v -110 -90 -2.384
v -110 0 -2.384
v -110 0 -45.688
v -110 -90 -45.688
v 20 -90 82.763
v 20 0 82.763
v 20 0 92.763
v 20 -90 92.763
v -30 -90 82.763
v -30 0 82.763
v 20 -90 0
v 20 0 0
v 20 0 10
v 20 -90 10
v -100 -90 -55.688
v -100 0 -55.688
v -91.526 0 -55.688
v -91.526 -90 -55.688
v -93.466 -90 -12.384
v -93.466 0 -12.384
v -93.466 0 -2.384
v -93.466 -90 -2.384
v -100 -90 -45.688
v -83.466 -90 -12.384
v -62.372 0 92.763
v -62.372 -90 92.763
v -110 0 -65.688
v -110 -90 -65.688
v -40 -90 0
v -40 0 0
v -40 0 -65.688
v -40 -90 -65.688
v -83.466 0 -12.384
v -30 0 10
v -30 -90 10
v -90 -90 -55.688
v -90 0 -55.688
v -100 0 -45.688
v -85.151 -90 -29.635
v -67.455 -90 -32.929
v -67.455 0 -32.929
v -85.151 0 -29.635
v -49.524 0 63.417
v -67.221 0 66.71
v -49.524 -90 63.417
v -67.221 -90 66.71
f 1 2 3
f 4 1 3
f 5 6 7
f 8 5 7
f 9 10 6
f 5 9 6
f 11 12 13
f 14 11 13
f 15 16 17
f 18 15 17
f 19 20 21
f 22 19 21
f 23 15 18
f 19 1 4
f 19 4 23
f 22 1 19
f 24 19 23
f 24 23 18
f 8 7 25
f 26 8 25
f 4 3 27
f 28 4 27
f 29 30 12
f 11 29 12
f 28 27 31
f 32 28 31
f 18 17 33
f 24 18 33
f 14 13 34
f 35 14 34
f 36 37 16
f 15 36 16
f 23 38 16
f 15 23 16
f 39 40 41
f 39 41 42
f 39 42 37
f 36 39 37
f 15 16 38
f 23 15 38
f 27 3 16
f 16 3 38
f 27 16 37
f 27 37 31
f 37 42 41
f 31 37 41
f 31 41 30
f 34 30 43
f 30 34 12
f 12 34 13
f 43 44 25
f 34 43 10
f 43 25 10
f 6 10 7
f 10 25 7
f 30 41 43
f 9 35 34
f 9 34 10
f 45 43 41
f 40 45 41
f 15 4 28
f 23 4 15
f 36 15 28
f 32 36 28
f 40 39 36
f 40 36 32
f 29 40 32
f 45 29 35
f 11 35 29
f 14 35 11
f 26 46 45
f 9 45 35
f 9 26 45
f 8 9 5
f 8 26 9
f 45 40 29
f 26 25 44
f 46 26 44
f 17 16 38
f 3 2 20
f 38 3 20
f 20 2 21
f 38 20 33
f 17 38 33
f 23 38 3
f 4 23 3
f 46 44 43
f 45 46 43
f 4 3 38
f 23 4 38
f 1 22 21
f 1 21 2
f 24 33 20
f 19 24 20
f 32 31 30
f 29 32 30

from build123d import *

# Parameters (mm, degrees)
F1_DEPTH = 90
F2_DEPTH = 90


# Not quite as in the source:
# - a feature names something its author has since deleted; it is built from what else it names


with BuildPart() as f1:
    # F0 (on Front) → F1 (new body)
    with BuildSketch(Plane.XZ):
        Polygon((-40, 92.7631145057), (-40, 0), (20, 0), (20, 10), (-30, 10), (-30, 82.7631145057), (20, 82.7631145057), (20, 92.7631145057), align=None)
        Polygon((-40, -65.6878501177), (-40, 0), (-40, 92.7631145057), (-62.3719146089, 92.7631145057), (-67.2205521113, 66.7104617738), (-49.5244106331, 63.4170476212), (-58.4898158262, 15.2442180415), (-67.4552210193, -32.9286115383), (-85.1513624976, -29.6351973858), (-90, -55.6878501177), (-91.5257563369, -55.6878501177), (-100, -55.6878501177), (-100, -45.6878501177), (-110, -45.6878501177), (-110, -65.6878501177), align=None)
    extrude(amount=F1_DEPTH)


with BuildPart() as f2:
    # F0 (on Front) → F2 (new body)
    with BuildSketch(Plane.XZ):
        Polygon((-110, -2.3839132024), (-110, -45.6878501177), (-100, -45.6878501177), (-100, -55.6878501177), (-91.5257563369, -55.6878501177), (-83.4664967026, -12.3839132024), (-93.4664967026, -12.3839132024), (-93.4664967026, -2.3839132024), align=None)
    extrude(amount=F2_DEPTH)


solid = Compound([f1.part, f2.part])
